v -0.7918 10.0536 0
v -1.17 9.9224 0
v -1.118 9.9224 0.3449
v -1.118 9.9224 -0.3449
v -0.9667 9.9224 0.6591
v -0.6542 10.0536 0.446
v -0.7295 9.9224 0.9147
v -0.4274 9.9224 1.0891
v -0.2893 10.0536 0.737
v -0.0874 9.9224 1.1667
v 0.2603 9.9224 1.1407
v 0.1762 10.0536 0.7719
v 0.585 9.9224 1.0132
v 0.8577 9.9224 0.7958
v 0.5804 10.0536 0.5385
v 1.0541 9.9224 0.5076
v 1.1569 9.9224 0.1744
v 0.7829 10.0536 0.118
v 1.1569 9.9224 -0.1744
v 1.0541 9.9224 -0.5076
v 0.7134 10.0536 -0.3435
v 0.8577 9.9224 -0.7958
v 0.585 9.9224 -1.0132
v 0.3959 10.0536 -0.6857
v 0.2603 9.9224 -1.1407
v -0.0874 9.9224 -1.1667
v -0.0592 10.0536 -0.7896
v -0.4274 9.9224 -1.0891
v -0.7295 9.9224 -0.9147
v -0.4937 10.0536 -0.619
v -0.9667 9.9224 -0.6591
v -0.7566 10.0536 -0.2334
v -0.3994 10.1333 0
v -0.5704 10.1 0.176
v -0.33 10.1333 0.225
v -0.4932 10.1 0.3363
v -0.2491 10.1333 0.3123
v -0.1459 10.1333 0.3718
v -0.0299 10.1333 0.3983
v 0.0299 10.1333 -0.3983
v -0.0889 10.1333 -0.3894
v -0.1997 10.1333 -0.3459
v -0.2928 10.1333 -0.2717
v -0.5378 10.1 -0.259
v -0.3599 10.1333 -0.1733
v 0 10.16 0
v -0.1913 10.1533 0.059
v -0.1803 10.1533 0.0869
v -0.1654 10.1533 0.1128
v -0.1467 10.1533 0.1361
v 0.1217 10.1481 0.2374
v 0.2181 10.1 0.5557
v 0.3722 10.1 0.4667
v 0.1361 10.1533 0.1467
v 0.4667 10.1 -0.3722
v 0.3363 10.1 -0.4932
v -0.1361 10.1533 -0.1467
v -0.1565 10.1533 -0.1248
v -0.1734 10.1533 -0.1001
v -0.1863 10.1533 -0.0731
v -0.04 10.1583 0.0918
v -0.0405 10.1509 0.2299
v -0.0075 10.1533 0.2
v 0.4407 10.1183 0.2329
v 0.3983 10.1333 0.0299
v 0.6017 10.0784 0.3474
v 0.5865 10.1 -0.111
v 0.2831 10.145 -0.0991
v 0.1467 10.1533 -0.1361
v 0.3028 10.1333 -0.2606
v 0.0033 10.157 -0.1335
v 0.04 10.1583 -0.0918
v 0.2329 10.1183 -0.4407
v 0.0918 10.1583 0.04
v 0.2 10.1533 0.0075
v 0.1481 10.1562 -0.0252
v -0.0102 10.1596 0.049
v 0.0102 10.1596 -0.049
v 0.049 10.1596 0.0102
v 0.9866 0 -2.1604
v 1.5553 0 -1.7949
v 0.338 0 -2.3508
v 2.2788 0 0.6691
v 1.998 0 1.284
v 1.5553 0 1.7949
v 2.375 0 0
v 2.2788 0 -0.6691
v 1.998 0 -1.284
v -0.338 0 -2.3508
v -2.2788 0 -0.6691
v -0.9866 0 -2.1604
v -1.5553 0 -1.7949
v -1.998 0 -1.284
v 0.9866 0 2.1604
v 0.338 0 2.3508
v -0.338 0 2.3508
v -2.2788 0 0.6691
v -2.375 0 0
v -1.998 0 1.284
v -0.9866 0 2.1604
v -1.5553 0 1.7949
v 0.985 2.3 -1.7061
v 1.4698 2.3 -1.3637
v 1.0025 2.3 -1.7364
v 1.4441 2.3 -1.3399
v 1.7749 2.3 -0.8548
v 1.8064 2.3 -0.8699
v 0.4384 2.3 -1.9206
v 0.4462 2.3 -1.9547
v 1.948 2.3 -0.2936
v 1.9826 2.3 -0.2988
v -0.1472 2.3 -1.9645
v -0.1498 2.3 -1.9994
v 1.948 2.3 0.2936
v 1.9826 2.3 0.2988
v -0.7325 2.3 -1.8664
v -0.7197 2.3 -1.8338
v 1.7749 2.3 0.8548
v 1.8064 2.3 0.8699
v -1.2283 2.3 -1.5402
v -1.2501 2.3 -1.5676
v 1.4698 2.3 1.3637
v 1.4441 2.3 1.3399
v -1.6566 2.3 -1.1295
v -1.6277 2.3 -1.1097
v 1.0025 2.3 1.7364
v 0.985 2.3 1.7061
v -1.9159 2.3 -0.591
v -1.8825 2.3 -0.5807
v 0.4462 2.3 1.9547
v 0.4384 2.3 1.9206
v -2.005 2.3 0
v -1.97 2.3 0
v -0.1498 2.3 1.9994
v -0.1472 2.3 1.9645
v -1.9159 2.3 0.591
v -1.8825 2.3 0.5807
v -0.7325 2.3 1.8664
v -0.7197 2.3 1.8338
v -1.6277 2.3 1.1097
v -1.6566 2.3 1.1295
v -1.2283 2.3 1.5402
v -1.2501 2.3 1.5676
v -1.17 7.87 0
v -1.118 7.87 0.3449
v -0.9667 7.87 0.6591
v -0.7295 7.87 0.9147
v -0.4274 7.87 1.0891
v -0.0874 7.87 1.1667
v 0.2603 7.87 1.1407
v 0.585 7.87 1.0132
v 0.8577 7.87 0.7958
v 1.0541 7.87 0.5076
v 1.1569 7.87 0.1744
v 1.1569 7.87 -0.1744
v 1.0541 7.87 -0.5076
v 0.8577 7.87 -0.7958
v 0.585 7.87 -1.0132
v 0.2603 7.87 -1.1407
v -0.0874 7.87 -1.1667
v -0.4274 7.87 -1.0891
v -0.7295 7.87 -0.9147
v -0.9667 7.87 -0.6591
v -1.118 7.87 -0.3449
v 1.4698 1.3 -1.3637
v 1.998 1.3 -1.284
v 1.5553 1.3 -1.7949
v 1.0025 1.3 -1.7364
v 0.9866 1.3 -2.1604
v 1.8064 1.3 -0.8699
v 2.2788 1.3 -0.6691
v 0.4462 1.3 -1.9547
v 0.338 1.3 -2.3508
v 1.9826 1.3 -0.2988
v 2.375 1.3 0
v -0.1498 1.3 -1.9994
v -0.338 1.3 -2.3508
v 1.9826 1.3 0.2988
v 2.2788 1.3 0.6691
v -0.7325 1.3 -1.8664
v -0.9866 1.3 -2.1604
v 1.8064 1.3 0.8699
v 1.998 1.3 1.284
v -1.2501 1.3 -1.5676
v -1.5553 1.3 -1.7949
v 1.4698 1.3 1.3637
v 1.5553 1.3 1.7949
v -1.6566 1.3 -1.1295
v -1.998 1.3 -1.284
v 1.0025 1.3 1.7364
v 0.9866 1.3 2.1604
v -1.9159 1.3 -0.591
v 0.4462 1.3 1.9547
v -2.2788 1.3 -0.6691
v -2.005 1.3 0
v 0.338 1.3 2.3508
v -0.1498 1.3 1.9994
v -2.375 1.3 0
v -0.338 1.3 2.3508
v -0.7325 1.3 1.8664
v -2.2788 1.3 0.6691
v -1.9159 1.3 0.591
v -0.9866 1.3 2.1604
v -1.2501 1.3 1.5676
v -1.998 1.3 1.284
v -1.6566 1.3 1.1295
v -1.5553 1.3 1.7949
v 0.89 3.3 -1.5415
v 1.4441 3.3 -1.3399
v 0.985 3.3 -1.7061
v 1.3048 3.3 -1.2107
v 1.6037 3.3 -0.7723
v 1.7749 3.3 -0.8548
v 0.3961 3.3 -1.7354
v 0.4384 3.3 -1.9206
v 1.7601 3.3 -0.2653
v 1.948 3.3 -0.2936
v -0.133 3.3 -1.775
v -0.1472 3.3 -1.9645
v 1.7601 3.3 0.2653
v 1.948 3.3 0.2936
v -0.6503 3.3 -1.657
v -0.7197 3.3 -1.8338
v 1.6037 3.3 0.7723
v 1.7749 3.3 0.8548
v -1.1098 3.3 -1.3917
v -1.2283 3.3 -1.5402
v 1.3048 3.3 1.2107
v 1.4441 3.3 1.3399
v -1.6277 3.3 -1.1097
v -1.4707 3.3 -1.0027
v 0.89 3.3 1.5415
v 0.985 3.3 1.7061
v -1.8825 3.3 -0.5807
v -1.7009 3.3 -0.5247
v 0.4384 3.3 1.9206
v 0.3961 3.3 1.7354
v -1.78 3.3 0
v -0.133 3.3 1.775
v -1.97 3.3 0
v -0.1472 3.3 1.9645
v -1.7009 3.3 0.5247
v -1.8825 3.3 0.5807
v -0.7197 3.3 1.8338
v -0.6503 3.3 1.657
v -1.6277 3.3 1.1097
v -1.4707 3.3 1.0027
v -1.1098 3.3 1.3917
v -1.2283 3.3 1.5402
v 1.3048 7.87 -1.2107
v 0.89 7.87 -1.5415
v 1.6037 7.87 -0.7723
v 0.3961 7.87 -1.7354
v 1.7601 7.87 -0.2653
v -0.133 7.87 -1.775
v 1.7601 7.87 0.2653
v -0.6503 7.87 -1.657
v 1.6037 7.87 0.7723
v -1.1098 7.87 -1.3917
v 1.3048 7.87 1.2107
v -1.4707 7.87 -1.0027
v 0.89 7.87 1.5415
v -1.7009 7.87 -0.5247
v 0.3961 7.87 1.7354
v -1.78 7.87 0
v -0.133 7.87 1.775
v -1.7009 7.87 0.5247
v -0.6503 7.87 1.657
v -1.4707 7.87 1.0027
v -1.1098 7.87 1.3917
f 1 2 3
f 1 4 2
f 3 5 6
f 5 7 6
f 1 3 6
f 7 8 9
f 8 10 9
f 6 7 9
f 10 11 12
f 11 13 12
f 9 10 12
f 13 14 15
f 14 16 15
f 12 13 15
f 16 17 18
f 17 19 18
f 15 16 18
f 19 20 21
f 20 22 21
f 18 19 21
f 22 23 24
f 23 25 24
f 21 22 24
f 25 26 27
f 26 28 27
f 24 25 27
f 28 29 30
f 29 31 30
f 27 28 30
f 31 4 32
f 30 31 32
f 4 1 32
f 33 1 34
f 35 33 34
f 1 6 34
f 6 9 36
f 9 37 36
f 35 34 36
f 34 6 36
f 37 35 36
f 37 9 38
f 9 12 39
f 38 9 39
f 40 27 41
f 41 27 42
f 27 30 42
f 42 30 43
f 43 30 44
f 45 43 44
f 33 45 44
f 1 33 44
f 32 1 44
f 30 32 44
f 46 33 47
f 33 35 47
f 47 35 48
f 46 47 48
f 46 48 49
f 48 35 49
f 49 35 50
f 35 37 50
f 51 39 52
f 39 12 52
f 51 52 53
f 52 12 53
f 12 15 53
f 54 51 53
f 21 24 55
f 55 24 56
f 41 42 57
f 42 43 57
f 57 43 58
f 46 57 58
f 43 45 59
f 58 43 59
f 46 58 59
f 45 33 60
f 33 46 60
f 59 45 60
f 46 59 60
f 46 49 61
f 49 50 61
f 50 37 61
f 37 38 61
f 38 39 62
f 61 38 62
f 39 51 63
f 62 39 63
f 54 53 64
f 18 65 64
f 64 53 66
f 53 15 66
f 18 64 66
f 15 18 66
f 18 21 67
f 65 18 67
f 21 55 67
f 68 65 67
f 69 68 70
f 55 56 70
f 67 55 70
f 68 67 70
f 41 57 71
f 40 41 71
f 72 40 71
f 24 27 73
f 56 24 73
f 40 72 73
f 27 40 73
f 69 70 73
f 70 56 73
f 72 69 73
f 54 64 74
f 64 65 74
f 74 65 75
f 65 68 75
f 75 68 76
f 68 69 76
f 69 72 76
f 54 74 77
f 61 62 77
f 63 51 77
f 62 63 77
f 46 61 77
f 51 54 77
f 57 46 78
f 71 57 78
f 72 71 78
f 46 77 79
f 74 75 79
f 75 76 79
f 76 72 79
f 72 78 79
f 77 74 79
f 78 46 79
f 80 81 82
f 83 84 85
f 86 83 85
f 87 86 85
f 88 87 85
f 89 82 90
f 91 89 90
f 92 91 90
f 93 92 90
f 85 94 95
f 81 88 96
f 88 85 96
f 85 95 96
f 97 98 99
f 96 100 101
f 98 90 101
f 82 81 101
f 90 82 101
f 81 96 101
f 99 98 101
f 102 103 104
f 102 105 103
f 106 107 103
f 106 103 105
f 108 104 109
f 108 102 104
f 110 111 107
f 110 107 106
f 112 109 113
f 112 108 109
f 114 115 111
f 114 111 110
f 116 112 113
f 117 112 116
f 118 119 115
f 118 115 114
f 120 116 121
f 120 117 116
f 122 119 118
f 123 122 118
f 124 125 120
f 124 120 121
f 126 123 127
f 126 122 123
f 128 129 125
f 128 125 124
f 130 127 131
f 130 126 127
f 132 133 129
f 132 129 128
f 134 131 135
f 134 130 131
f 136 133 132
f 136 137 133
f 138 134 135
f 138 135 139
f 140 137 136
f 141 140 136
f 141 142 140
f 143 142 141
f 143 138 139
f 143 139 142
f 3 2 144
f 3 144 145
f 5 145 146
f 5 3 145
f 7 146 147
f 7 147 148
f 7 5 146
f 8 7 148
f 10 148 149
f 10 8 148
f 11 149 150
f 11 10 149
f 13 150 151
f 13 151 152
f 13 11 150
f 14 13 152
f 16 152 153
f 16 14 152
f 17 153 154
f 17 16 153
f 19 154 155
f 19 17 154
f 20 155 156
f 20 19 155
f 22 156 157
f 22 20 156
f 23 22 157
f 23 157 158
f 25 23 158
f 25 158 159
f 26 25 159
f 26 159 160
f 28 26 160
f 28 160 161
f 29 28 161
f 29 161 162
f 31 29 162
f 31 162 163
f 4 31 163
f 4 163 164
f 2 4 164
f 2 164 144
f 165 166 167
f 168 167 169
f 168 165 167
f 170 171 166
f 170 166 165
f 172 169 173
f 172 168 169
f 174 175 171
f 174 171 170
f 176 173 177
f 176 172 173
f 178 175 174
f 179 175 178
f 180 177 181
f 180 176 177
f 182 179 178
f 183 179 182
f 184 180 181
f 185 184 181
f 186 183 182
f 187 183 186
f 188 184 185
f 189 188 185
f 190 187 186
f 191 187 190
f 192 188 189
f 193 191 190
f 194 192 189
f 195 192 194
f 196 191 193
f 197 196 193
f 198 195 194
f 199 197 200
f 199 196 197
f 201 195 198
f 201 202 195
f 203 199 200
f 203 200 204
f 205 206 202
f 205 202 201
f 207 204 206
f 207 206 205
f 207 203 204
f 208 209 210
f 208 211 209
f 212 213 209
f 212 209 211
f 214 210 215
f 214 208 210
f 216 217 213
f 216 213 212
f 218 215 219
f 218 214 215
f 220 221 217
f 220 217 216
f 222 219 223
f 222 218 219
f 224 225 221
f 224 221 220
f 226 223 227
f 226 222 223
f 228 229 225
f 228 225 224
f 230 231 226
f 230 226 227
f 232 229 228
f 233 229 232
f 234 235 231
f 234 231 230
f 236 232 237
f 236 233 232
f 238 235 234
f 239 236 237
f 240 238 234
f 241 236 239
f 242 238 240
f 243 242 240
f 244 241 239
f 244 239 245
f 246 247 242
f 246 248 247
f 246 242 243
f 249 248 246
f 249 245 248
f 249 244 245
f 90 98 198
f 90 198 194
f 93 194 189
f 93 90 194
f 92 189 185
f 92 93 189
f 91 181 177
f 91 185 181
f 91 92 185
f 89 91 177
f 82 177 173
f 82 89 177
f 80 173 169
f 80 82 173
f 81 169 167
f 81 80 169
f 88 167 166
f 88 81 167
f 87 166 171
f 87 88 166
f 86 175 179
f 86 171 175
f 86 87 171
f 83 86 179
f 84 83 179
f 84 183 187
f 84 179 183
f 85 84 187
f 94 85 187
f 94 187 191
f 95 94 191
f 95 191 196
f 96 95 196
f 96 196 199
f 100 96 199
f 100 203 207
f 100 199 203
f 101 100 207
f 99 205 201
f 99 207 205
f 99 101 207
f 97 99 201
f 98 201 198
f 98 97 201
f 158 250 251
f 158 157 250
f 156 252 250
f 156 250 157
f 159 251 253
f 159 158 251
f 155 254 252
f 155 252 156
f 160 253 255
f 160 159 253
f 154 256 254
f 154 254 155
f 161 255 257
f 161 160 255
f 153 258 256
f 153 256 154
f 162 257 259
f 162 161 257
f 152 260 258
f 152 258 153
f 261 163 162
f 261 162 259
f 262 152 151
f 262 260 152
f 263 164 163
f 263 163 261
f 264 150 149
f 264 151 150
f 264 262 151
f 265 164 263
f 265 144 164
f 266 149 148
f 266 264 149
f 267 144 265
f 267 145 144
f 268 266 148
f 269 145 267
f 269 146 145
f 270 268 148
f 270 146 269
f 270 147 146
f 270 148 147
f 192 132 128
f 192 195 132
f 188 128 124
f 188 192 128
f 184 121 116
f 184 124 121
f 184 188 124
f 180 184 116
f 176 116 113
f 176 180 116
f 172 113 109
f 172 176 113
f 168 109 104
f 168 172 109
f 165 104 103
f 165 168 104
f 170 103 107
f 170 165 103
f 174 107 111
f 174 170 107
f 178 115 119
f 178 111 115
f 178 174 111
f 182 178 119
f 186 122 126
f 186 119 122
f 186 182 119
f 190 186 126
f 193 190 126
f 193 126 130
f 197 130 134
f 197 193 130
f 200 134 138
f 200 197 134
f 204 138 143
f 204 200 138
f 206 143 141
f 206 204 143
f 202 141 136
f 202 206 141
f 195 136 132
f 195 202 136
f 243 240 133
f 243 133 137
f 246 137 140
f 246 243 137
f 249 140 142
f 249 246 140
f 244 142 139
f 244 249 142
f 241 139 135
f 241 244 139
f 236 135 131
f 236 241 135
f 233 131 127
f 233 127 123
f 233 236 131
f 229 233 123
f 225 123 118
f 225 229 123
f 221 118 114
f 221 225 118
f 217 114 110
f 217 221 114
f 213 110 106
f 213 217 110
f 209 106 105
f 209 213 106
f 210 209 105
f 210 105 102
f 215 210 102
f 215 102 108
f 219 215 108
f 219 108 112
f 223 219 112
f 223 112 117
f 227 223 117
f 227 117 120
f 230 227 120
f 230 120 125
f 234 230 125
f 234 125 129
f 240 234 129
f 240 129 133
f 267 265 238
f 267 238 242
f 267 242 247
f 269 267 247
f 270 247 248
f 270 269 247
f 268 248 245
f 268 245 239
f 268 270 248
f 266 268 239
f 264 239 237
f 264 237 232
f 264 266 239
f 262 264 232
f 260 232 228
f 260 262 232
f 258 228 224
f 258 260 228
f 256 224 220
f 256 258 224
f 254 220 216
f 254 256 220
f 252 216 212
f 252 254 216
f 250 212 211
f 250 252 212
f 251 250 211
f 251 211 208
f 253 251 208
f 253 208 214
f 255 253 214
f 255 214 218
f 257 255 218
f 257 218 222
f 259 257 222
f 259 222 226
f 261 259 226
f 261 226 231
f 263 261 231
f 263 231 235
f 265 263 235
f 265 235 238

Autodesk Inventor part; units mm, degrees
ref_plane "YZ Plane" through (0, 0, 0) normal (1, 0, 0) x (0, 1, 0)
ref_plane "XZ Plane" through (0, 0, 0) normal (0, 1, 0) x (-1, 0, 0)
ref_plane "XY Plane" through (0, 0, 0) normal (0, 0, 1) x (1, 0, 0)
sketch "Sketch1" plane through (0, 0, 0) normal (0, 0, 1) x (1, 0, 0)
  line L0 (0, 0) -> (-2.375, 0)
  line L1 (-1.97, 2.3) -> (-1.97, 3.3)
  line L2 (-1.97, 3.3) -> (-1.78, 3.3)
  line L3 (-1.78, 3.3) -> (-1.78, 7.87)
  line L4 (-1.78, 7.87) -> (-1.17, 7.87)
  line L5 (-1.17, 7.87) -> (-1.17, 9.9224)
  arc A0 (0, 10.16) -> (-1.17, 9.9224) centre (0, 7.16) ccw
  line L6 (0, 0) -> (0, 10.16)
  line L7 (-1.97, 2.3) -> (-2.005, 2.3)
  line L8 (-2.005, 2.3) -> (-2.005, 1.3)
  line L9 (-2.005, 1.3) -> (-2.375, 1.3)
  line L10 (-2.375, 1.3) -> (-2.375, 0)
  dimension "d0" = 1.17
  dimension "d1" = 1.78
  dimension "d2" = 1.97
  dimension "d3" = 2.005
  dimension "d4" = 2.375
  dimension "d5" = 1.3
  dimension "d6" = 7.87
  dimension "d7" = 2.29
  dimension "d8" = 1
  dimension "d9" = 1
  dimension "d10" = 3
revolve "Revolution1" add sketch "Sketch1" angle 360 about axis through (0, 0, 0) along (0, 1, 0)
properties part number "0871 Spring Loaded"
